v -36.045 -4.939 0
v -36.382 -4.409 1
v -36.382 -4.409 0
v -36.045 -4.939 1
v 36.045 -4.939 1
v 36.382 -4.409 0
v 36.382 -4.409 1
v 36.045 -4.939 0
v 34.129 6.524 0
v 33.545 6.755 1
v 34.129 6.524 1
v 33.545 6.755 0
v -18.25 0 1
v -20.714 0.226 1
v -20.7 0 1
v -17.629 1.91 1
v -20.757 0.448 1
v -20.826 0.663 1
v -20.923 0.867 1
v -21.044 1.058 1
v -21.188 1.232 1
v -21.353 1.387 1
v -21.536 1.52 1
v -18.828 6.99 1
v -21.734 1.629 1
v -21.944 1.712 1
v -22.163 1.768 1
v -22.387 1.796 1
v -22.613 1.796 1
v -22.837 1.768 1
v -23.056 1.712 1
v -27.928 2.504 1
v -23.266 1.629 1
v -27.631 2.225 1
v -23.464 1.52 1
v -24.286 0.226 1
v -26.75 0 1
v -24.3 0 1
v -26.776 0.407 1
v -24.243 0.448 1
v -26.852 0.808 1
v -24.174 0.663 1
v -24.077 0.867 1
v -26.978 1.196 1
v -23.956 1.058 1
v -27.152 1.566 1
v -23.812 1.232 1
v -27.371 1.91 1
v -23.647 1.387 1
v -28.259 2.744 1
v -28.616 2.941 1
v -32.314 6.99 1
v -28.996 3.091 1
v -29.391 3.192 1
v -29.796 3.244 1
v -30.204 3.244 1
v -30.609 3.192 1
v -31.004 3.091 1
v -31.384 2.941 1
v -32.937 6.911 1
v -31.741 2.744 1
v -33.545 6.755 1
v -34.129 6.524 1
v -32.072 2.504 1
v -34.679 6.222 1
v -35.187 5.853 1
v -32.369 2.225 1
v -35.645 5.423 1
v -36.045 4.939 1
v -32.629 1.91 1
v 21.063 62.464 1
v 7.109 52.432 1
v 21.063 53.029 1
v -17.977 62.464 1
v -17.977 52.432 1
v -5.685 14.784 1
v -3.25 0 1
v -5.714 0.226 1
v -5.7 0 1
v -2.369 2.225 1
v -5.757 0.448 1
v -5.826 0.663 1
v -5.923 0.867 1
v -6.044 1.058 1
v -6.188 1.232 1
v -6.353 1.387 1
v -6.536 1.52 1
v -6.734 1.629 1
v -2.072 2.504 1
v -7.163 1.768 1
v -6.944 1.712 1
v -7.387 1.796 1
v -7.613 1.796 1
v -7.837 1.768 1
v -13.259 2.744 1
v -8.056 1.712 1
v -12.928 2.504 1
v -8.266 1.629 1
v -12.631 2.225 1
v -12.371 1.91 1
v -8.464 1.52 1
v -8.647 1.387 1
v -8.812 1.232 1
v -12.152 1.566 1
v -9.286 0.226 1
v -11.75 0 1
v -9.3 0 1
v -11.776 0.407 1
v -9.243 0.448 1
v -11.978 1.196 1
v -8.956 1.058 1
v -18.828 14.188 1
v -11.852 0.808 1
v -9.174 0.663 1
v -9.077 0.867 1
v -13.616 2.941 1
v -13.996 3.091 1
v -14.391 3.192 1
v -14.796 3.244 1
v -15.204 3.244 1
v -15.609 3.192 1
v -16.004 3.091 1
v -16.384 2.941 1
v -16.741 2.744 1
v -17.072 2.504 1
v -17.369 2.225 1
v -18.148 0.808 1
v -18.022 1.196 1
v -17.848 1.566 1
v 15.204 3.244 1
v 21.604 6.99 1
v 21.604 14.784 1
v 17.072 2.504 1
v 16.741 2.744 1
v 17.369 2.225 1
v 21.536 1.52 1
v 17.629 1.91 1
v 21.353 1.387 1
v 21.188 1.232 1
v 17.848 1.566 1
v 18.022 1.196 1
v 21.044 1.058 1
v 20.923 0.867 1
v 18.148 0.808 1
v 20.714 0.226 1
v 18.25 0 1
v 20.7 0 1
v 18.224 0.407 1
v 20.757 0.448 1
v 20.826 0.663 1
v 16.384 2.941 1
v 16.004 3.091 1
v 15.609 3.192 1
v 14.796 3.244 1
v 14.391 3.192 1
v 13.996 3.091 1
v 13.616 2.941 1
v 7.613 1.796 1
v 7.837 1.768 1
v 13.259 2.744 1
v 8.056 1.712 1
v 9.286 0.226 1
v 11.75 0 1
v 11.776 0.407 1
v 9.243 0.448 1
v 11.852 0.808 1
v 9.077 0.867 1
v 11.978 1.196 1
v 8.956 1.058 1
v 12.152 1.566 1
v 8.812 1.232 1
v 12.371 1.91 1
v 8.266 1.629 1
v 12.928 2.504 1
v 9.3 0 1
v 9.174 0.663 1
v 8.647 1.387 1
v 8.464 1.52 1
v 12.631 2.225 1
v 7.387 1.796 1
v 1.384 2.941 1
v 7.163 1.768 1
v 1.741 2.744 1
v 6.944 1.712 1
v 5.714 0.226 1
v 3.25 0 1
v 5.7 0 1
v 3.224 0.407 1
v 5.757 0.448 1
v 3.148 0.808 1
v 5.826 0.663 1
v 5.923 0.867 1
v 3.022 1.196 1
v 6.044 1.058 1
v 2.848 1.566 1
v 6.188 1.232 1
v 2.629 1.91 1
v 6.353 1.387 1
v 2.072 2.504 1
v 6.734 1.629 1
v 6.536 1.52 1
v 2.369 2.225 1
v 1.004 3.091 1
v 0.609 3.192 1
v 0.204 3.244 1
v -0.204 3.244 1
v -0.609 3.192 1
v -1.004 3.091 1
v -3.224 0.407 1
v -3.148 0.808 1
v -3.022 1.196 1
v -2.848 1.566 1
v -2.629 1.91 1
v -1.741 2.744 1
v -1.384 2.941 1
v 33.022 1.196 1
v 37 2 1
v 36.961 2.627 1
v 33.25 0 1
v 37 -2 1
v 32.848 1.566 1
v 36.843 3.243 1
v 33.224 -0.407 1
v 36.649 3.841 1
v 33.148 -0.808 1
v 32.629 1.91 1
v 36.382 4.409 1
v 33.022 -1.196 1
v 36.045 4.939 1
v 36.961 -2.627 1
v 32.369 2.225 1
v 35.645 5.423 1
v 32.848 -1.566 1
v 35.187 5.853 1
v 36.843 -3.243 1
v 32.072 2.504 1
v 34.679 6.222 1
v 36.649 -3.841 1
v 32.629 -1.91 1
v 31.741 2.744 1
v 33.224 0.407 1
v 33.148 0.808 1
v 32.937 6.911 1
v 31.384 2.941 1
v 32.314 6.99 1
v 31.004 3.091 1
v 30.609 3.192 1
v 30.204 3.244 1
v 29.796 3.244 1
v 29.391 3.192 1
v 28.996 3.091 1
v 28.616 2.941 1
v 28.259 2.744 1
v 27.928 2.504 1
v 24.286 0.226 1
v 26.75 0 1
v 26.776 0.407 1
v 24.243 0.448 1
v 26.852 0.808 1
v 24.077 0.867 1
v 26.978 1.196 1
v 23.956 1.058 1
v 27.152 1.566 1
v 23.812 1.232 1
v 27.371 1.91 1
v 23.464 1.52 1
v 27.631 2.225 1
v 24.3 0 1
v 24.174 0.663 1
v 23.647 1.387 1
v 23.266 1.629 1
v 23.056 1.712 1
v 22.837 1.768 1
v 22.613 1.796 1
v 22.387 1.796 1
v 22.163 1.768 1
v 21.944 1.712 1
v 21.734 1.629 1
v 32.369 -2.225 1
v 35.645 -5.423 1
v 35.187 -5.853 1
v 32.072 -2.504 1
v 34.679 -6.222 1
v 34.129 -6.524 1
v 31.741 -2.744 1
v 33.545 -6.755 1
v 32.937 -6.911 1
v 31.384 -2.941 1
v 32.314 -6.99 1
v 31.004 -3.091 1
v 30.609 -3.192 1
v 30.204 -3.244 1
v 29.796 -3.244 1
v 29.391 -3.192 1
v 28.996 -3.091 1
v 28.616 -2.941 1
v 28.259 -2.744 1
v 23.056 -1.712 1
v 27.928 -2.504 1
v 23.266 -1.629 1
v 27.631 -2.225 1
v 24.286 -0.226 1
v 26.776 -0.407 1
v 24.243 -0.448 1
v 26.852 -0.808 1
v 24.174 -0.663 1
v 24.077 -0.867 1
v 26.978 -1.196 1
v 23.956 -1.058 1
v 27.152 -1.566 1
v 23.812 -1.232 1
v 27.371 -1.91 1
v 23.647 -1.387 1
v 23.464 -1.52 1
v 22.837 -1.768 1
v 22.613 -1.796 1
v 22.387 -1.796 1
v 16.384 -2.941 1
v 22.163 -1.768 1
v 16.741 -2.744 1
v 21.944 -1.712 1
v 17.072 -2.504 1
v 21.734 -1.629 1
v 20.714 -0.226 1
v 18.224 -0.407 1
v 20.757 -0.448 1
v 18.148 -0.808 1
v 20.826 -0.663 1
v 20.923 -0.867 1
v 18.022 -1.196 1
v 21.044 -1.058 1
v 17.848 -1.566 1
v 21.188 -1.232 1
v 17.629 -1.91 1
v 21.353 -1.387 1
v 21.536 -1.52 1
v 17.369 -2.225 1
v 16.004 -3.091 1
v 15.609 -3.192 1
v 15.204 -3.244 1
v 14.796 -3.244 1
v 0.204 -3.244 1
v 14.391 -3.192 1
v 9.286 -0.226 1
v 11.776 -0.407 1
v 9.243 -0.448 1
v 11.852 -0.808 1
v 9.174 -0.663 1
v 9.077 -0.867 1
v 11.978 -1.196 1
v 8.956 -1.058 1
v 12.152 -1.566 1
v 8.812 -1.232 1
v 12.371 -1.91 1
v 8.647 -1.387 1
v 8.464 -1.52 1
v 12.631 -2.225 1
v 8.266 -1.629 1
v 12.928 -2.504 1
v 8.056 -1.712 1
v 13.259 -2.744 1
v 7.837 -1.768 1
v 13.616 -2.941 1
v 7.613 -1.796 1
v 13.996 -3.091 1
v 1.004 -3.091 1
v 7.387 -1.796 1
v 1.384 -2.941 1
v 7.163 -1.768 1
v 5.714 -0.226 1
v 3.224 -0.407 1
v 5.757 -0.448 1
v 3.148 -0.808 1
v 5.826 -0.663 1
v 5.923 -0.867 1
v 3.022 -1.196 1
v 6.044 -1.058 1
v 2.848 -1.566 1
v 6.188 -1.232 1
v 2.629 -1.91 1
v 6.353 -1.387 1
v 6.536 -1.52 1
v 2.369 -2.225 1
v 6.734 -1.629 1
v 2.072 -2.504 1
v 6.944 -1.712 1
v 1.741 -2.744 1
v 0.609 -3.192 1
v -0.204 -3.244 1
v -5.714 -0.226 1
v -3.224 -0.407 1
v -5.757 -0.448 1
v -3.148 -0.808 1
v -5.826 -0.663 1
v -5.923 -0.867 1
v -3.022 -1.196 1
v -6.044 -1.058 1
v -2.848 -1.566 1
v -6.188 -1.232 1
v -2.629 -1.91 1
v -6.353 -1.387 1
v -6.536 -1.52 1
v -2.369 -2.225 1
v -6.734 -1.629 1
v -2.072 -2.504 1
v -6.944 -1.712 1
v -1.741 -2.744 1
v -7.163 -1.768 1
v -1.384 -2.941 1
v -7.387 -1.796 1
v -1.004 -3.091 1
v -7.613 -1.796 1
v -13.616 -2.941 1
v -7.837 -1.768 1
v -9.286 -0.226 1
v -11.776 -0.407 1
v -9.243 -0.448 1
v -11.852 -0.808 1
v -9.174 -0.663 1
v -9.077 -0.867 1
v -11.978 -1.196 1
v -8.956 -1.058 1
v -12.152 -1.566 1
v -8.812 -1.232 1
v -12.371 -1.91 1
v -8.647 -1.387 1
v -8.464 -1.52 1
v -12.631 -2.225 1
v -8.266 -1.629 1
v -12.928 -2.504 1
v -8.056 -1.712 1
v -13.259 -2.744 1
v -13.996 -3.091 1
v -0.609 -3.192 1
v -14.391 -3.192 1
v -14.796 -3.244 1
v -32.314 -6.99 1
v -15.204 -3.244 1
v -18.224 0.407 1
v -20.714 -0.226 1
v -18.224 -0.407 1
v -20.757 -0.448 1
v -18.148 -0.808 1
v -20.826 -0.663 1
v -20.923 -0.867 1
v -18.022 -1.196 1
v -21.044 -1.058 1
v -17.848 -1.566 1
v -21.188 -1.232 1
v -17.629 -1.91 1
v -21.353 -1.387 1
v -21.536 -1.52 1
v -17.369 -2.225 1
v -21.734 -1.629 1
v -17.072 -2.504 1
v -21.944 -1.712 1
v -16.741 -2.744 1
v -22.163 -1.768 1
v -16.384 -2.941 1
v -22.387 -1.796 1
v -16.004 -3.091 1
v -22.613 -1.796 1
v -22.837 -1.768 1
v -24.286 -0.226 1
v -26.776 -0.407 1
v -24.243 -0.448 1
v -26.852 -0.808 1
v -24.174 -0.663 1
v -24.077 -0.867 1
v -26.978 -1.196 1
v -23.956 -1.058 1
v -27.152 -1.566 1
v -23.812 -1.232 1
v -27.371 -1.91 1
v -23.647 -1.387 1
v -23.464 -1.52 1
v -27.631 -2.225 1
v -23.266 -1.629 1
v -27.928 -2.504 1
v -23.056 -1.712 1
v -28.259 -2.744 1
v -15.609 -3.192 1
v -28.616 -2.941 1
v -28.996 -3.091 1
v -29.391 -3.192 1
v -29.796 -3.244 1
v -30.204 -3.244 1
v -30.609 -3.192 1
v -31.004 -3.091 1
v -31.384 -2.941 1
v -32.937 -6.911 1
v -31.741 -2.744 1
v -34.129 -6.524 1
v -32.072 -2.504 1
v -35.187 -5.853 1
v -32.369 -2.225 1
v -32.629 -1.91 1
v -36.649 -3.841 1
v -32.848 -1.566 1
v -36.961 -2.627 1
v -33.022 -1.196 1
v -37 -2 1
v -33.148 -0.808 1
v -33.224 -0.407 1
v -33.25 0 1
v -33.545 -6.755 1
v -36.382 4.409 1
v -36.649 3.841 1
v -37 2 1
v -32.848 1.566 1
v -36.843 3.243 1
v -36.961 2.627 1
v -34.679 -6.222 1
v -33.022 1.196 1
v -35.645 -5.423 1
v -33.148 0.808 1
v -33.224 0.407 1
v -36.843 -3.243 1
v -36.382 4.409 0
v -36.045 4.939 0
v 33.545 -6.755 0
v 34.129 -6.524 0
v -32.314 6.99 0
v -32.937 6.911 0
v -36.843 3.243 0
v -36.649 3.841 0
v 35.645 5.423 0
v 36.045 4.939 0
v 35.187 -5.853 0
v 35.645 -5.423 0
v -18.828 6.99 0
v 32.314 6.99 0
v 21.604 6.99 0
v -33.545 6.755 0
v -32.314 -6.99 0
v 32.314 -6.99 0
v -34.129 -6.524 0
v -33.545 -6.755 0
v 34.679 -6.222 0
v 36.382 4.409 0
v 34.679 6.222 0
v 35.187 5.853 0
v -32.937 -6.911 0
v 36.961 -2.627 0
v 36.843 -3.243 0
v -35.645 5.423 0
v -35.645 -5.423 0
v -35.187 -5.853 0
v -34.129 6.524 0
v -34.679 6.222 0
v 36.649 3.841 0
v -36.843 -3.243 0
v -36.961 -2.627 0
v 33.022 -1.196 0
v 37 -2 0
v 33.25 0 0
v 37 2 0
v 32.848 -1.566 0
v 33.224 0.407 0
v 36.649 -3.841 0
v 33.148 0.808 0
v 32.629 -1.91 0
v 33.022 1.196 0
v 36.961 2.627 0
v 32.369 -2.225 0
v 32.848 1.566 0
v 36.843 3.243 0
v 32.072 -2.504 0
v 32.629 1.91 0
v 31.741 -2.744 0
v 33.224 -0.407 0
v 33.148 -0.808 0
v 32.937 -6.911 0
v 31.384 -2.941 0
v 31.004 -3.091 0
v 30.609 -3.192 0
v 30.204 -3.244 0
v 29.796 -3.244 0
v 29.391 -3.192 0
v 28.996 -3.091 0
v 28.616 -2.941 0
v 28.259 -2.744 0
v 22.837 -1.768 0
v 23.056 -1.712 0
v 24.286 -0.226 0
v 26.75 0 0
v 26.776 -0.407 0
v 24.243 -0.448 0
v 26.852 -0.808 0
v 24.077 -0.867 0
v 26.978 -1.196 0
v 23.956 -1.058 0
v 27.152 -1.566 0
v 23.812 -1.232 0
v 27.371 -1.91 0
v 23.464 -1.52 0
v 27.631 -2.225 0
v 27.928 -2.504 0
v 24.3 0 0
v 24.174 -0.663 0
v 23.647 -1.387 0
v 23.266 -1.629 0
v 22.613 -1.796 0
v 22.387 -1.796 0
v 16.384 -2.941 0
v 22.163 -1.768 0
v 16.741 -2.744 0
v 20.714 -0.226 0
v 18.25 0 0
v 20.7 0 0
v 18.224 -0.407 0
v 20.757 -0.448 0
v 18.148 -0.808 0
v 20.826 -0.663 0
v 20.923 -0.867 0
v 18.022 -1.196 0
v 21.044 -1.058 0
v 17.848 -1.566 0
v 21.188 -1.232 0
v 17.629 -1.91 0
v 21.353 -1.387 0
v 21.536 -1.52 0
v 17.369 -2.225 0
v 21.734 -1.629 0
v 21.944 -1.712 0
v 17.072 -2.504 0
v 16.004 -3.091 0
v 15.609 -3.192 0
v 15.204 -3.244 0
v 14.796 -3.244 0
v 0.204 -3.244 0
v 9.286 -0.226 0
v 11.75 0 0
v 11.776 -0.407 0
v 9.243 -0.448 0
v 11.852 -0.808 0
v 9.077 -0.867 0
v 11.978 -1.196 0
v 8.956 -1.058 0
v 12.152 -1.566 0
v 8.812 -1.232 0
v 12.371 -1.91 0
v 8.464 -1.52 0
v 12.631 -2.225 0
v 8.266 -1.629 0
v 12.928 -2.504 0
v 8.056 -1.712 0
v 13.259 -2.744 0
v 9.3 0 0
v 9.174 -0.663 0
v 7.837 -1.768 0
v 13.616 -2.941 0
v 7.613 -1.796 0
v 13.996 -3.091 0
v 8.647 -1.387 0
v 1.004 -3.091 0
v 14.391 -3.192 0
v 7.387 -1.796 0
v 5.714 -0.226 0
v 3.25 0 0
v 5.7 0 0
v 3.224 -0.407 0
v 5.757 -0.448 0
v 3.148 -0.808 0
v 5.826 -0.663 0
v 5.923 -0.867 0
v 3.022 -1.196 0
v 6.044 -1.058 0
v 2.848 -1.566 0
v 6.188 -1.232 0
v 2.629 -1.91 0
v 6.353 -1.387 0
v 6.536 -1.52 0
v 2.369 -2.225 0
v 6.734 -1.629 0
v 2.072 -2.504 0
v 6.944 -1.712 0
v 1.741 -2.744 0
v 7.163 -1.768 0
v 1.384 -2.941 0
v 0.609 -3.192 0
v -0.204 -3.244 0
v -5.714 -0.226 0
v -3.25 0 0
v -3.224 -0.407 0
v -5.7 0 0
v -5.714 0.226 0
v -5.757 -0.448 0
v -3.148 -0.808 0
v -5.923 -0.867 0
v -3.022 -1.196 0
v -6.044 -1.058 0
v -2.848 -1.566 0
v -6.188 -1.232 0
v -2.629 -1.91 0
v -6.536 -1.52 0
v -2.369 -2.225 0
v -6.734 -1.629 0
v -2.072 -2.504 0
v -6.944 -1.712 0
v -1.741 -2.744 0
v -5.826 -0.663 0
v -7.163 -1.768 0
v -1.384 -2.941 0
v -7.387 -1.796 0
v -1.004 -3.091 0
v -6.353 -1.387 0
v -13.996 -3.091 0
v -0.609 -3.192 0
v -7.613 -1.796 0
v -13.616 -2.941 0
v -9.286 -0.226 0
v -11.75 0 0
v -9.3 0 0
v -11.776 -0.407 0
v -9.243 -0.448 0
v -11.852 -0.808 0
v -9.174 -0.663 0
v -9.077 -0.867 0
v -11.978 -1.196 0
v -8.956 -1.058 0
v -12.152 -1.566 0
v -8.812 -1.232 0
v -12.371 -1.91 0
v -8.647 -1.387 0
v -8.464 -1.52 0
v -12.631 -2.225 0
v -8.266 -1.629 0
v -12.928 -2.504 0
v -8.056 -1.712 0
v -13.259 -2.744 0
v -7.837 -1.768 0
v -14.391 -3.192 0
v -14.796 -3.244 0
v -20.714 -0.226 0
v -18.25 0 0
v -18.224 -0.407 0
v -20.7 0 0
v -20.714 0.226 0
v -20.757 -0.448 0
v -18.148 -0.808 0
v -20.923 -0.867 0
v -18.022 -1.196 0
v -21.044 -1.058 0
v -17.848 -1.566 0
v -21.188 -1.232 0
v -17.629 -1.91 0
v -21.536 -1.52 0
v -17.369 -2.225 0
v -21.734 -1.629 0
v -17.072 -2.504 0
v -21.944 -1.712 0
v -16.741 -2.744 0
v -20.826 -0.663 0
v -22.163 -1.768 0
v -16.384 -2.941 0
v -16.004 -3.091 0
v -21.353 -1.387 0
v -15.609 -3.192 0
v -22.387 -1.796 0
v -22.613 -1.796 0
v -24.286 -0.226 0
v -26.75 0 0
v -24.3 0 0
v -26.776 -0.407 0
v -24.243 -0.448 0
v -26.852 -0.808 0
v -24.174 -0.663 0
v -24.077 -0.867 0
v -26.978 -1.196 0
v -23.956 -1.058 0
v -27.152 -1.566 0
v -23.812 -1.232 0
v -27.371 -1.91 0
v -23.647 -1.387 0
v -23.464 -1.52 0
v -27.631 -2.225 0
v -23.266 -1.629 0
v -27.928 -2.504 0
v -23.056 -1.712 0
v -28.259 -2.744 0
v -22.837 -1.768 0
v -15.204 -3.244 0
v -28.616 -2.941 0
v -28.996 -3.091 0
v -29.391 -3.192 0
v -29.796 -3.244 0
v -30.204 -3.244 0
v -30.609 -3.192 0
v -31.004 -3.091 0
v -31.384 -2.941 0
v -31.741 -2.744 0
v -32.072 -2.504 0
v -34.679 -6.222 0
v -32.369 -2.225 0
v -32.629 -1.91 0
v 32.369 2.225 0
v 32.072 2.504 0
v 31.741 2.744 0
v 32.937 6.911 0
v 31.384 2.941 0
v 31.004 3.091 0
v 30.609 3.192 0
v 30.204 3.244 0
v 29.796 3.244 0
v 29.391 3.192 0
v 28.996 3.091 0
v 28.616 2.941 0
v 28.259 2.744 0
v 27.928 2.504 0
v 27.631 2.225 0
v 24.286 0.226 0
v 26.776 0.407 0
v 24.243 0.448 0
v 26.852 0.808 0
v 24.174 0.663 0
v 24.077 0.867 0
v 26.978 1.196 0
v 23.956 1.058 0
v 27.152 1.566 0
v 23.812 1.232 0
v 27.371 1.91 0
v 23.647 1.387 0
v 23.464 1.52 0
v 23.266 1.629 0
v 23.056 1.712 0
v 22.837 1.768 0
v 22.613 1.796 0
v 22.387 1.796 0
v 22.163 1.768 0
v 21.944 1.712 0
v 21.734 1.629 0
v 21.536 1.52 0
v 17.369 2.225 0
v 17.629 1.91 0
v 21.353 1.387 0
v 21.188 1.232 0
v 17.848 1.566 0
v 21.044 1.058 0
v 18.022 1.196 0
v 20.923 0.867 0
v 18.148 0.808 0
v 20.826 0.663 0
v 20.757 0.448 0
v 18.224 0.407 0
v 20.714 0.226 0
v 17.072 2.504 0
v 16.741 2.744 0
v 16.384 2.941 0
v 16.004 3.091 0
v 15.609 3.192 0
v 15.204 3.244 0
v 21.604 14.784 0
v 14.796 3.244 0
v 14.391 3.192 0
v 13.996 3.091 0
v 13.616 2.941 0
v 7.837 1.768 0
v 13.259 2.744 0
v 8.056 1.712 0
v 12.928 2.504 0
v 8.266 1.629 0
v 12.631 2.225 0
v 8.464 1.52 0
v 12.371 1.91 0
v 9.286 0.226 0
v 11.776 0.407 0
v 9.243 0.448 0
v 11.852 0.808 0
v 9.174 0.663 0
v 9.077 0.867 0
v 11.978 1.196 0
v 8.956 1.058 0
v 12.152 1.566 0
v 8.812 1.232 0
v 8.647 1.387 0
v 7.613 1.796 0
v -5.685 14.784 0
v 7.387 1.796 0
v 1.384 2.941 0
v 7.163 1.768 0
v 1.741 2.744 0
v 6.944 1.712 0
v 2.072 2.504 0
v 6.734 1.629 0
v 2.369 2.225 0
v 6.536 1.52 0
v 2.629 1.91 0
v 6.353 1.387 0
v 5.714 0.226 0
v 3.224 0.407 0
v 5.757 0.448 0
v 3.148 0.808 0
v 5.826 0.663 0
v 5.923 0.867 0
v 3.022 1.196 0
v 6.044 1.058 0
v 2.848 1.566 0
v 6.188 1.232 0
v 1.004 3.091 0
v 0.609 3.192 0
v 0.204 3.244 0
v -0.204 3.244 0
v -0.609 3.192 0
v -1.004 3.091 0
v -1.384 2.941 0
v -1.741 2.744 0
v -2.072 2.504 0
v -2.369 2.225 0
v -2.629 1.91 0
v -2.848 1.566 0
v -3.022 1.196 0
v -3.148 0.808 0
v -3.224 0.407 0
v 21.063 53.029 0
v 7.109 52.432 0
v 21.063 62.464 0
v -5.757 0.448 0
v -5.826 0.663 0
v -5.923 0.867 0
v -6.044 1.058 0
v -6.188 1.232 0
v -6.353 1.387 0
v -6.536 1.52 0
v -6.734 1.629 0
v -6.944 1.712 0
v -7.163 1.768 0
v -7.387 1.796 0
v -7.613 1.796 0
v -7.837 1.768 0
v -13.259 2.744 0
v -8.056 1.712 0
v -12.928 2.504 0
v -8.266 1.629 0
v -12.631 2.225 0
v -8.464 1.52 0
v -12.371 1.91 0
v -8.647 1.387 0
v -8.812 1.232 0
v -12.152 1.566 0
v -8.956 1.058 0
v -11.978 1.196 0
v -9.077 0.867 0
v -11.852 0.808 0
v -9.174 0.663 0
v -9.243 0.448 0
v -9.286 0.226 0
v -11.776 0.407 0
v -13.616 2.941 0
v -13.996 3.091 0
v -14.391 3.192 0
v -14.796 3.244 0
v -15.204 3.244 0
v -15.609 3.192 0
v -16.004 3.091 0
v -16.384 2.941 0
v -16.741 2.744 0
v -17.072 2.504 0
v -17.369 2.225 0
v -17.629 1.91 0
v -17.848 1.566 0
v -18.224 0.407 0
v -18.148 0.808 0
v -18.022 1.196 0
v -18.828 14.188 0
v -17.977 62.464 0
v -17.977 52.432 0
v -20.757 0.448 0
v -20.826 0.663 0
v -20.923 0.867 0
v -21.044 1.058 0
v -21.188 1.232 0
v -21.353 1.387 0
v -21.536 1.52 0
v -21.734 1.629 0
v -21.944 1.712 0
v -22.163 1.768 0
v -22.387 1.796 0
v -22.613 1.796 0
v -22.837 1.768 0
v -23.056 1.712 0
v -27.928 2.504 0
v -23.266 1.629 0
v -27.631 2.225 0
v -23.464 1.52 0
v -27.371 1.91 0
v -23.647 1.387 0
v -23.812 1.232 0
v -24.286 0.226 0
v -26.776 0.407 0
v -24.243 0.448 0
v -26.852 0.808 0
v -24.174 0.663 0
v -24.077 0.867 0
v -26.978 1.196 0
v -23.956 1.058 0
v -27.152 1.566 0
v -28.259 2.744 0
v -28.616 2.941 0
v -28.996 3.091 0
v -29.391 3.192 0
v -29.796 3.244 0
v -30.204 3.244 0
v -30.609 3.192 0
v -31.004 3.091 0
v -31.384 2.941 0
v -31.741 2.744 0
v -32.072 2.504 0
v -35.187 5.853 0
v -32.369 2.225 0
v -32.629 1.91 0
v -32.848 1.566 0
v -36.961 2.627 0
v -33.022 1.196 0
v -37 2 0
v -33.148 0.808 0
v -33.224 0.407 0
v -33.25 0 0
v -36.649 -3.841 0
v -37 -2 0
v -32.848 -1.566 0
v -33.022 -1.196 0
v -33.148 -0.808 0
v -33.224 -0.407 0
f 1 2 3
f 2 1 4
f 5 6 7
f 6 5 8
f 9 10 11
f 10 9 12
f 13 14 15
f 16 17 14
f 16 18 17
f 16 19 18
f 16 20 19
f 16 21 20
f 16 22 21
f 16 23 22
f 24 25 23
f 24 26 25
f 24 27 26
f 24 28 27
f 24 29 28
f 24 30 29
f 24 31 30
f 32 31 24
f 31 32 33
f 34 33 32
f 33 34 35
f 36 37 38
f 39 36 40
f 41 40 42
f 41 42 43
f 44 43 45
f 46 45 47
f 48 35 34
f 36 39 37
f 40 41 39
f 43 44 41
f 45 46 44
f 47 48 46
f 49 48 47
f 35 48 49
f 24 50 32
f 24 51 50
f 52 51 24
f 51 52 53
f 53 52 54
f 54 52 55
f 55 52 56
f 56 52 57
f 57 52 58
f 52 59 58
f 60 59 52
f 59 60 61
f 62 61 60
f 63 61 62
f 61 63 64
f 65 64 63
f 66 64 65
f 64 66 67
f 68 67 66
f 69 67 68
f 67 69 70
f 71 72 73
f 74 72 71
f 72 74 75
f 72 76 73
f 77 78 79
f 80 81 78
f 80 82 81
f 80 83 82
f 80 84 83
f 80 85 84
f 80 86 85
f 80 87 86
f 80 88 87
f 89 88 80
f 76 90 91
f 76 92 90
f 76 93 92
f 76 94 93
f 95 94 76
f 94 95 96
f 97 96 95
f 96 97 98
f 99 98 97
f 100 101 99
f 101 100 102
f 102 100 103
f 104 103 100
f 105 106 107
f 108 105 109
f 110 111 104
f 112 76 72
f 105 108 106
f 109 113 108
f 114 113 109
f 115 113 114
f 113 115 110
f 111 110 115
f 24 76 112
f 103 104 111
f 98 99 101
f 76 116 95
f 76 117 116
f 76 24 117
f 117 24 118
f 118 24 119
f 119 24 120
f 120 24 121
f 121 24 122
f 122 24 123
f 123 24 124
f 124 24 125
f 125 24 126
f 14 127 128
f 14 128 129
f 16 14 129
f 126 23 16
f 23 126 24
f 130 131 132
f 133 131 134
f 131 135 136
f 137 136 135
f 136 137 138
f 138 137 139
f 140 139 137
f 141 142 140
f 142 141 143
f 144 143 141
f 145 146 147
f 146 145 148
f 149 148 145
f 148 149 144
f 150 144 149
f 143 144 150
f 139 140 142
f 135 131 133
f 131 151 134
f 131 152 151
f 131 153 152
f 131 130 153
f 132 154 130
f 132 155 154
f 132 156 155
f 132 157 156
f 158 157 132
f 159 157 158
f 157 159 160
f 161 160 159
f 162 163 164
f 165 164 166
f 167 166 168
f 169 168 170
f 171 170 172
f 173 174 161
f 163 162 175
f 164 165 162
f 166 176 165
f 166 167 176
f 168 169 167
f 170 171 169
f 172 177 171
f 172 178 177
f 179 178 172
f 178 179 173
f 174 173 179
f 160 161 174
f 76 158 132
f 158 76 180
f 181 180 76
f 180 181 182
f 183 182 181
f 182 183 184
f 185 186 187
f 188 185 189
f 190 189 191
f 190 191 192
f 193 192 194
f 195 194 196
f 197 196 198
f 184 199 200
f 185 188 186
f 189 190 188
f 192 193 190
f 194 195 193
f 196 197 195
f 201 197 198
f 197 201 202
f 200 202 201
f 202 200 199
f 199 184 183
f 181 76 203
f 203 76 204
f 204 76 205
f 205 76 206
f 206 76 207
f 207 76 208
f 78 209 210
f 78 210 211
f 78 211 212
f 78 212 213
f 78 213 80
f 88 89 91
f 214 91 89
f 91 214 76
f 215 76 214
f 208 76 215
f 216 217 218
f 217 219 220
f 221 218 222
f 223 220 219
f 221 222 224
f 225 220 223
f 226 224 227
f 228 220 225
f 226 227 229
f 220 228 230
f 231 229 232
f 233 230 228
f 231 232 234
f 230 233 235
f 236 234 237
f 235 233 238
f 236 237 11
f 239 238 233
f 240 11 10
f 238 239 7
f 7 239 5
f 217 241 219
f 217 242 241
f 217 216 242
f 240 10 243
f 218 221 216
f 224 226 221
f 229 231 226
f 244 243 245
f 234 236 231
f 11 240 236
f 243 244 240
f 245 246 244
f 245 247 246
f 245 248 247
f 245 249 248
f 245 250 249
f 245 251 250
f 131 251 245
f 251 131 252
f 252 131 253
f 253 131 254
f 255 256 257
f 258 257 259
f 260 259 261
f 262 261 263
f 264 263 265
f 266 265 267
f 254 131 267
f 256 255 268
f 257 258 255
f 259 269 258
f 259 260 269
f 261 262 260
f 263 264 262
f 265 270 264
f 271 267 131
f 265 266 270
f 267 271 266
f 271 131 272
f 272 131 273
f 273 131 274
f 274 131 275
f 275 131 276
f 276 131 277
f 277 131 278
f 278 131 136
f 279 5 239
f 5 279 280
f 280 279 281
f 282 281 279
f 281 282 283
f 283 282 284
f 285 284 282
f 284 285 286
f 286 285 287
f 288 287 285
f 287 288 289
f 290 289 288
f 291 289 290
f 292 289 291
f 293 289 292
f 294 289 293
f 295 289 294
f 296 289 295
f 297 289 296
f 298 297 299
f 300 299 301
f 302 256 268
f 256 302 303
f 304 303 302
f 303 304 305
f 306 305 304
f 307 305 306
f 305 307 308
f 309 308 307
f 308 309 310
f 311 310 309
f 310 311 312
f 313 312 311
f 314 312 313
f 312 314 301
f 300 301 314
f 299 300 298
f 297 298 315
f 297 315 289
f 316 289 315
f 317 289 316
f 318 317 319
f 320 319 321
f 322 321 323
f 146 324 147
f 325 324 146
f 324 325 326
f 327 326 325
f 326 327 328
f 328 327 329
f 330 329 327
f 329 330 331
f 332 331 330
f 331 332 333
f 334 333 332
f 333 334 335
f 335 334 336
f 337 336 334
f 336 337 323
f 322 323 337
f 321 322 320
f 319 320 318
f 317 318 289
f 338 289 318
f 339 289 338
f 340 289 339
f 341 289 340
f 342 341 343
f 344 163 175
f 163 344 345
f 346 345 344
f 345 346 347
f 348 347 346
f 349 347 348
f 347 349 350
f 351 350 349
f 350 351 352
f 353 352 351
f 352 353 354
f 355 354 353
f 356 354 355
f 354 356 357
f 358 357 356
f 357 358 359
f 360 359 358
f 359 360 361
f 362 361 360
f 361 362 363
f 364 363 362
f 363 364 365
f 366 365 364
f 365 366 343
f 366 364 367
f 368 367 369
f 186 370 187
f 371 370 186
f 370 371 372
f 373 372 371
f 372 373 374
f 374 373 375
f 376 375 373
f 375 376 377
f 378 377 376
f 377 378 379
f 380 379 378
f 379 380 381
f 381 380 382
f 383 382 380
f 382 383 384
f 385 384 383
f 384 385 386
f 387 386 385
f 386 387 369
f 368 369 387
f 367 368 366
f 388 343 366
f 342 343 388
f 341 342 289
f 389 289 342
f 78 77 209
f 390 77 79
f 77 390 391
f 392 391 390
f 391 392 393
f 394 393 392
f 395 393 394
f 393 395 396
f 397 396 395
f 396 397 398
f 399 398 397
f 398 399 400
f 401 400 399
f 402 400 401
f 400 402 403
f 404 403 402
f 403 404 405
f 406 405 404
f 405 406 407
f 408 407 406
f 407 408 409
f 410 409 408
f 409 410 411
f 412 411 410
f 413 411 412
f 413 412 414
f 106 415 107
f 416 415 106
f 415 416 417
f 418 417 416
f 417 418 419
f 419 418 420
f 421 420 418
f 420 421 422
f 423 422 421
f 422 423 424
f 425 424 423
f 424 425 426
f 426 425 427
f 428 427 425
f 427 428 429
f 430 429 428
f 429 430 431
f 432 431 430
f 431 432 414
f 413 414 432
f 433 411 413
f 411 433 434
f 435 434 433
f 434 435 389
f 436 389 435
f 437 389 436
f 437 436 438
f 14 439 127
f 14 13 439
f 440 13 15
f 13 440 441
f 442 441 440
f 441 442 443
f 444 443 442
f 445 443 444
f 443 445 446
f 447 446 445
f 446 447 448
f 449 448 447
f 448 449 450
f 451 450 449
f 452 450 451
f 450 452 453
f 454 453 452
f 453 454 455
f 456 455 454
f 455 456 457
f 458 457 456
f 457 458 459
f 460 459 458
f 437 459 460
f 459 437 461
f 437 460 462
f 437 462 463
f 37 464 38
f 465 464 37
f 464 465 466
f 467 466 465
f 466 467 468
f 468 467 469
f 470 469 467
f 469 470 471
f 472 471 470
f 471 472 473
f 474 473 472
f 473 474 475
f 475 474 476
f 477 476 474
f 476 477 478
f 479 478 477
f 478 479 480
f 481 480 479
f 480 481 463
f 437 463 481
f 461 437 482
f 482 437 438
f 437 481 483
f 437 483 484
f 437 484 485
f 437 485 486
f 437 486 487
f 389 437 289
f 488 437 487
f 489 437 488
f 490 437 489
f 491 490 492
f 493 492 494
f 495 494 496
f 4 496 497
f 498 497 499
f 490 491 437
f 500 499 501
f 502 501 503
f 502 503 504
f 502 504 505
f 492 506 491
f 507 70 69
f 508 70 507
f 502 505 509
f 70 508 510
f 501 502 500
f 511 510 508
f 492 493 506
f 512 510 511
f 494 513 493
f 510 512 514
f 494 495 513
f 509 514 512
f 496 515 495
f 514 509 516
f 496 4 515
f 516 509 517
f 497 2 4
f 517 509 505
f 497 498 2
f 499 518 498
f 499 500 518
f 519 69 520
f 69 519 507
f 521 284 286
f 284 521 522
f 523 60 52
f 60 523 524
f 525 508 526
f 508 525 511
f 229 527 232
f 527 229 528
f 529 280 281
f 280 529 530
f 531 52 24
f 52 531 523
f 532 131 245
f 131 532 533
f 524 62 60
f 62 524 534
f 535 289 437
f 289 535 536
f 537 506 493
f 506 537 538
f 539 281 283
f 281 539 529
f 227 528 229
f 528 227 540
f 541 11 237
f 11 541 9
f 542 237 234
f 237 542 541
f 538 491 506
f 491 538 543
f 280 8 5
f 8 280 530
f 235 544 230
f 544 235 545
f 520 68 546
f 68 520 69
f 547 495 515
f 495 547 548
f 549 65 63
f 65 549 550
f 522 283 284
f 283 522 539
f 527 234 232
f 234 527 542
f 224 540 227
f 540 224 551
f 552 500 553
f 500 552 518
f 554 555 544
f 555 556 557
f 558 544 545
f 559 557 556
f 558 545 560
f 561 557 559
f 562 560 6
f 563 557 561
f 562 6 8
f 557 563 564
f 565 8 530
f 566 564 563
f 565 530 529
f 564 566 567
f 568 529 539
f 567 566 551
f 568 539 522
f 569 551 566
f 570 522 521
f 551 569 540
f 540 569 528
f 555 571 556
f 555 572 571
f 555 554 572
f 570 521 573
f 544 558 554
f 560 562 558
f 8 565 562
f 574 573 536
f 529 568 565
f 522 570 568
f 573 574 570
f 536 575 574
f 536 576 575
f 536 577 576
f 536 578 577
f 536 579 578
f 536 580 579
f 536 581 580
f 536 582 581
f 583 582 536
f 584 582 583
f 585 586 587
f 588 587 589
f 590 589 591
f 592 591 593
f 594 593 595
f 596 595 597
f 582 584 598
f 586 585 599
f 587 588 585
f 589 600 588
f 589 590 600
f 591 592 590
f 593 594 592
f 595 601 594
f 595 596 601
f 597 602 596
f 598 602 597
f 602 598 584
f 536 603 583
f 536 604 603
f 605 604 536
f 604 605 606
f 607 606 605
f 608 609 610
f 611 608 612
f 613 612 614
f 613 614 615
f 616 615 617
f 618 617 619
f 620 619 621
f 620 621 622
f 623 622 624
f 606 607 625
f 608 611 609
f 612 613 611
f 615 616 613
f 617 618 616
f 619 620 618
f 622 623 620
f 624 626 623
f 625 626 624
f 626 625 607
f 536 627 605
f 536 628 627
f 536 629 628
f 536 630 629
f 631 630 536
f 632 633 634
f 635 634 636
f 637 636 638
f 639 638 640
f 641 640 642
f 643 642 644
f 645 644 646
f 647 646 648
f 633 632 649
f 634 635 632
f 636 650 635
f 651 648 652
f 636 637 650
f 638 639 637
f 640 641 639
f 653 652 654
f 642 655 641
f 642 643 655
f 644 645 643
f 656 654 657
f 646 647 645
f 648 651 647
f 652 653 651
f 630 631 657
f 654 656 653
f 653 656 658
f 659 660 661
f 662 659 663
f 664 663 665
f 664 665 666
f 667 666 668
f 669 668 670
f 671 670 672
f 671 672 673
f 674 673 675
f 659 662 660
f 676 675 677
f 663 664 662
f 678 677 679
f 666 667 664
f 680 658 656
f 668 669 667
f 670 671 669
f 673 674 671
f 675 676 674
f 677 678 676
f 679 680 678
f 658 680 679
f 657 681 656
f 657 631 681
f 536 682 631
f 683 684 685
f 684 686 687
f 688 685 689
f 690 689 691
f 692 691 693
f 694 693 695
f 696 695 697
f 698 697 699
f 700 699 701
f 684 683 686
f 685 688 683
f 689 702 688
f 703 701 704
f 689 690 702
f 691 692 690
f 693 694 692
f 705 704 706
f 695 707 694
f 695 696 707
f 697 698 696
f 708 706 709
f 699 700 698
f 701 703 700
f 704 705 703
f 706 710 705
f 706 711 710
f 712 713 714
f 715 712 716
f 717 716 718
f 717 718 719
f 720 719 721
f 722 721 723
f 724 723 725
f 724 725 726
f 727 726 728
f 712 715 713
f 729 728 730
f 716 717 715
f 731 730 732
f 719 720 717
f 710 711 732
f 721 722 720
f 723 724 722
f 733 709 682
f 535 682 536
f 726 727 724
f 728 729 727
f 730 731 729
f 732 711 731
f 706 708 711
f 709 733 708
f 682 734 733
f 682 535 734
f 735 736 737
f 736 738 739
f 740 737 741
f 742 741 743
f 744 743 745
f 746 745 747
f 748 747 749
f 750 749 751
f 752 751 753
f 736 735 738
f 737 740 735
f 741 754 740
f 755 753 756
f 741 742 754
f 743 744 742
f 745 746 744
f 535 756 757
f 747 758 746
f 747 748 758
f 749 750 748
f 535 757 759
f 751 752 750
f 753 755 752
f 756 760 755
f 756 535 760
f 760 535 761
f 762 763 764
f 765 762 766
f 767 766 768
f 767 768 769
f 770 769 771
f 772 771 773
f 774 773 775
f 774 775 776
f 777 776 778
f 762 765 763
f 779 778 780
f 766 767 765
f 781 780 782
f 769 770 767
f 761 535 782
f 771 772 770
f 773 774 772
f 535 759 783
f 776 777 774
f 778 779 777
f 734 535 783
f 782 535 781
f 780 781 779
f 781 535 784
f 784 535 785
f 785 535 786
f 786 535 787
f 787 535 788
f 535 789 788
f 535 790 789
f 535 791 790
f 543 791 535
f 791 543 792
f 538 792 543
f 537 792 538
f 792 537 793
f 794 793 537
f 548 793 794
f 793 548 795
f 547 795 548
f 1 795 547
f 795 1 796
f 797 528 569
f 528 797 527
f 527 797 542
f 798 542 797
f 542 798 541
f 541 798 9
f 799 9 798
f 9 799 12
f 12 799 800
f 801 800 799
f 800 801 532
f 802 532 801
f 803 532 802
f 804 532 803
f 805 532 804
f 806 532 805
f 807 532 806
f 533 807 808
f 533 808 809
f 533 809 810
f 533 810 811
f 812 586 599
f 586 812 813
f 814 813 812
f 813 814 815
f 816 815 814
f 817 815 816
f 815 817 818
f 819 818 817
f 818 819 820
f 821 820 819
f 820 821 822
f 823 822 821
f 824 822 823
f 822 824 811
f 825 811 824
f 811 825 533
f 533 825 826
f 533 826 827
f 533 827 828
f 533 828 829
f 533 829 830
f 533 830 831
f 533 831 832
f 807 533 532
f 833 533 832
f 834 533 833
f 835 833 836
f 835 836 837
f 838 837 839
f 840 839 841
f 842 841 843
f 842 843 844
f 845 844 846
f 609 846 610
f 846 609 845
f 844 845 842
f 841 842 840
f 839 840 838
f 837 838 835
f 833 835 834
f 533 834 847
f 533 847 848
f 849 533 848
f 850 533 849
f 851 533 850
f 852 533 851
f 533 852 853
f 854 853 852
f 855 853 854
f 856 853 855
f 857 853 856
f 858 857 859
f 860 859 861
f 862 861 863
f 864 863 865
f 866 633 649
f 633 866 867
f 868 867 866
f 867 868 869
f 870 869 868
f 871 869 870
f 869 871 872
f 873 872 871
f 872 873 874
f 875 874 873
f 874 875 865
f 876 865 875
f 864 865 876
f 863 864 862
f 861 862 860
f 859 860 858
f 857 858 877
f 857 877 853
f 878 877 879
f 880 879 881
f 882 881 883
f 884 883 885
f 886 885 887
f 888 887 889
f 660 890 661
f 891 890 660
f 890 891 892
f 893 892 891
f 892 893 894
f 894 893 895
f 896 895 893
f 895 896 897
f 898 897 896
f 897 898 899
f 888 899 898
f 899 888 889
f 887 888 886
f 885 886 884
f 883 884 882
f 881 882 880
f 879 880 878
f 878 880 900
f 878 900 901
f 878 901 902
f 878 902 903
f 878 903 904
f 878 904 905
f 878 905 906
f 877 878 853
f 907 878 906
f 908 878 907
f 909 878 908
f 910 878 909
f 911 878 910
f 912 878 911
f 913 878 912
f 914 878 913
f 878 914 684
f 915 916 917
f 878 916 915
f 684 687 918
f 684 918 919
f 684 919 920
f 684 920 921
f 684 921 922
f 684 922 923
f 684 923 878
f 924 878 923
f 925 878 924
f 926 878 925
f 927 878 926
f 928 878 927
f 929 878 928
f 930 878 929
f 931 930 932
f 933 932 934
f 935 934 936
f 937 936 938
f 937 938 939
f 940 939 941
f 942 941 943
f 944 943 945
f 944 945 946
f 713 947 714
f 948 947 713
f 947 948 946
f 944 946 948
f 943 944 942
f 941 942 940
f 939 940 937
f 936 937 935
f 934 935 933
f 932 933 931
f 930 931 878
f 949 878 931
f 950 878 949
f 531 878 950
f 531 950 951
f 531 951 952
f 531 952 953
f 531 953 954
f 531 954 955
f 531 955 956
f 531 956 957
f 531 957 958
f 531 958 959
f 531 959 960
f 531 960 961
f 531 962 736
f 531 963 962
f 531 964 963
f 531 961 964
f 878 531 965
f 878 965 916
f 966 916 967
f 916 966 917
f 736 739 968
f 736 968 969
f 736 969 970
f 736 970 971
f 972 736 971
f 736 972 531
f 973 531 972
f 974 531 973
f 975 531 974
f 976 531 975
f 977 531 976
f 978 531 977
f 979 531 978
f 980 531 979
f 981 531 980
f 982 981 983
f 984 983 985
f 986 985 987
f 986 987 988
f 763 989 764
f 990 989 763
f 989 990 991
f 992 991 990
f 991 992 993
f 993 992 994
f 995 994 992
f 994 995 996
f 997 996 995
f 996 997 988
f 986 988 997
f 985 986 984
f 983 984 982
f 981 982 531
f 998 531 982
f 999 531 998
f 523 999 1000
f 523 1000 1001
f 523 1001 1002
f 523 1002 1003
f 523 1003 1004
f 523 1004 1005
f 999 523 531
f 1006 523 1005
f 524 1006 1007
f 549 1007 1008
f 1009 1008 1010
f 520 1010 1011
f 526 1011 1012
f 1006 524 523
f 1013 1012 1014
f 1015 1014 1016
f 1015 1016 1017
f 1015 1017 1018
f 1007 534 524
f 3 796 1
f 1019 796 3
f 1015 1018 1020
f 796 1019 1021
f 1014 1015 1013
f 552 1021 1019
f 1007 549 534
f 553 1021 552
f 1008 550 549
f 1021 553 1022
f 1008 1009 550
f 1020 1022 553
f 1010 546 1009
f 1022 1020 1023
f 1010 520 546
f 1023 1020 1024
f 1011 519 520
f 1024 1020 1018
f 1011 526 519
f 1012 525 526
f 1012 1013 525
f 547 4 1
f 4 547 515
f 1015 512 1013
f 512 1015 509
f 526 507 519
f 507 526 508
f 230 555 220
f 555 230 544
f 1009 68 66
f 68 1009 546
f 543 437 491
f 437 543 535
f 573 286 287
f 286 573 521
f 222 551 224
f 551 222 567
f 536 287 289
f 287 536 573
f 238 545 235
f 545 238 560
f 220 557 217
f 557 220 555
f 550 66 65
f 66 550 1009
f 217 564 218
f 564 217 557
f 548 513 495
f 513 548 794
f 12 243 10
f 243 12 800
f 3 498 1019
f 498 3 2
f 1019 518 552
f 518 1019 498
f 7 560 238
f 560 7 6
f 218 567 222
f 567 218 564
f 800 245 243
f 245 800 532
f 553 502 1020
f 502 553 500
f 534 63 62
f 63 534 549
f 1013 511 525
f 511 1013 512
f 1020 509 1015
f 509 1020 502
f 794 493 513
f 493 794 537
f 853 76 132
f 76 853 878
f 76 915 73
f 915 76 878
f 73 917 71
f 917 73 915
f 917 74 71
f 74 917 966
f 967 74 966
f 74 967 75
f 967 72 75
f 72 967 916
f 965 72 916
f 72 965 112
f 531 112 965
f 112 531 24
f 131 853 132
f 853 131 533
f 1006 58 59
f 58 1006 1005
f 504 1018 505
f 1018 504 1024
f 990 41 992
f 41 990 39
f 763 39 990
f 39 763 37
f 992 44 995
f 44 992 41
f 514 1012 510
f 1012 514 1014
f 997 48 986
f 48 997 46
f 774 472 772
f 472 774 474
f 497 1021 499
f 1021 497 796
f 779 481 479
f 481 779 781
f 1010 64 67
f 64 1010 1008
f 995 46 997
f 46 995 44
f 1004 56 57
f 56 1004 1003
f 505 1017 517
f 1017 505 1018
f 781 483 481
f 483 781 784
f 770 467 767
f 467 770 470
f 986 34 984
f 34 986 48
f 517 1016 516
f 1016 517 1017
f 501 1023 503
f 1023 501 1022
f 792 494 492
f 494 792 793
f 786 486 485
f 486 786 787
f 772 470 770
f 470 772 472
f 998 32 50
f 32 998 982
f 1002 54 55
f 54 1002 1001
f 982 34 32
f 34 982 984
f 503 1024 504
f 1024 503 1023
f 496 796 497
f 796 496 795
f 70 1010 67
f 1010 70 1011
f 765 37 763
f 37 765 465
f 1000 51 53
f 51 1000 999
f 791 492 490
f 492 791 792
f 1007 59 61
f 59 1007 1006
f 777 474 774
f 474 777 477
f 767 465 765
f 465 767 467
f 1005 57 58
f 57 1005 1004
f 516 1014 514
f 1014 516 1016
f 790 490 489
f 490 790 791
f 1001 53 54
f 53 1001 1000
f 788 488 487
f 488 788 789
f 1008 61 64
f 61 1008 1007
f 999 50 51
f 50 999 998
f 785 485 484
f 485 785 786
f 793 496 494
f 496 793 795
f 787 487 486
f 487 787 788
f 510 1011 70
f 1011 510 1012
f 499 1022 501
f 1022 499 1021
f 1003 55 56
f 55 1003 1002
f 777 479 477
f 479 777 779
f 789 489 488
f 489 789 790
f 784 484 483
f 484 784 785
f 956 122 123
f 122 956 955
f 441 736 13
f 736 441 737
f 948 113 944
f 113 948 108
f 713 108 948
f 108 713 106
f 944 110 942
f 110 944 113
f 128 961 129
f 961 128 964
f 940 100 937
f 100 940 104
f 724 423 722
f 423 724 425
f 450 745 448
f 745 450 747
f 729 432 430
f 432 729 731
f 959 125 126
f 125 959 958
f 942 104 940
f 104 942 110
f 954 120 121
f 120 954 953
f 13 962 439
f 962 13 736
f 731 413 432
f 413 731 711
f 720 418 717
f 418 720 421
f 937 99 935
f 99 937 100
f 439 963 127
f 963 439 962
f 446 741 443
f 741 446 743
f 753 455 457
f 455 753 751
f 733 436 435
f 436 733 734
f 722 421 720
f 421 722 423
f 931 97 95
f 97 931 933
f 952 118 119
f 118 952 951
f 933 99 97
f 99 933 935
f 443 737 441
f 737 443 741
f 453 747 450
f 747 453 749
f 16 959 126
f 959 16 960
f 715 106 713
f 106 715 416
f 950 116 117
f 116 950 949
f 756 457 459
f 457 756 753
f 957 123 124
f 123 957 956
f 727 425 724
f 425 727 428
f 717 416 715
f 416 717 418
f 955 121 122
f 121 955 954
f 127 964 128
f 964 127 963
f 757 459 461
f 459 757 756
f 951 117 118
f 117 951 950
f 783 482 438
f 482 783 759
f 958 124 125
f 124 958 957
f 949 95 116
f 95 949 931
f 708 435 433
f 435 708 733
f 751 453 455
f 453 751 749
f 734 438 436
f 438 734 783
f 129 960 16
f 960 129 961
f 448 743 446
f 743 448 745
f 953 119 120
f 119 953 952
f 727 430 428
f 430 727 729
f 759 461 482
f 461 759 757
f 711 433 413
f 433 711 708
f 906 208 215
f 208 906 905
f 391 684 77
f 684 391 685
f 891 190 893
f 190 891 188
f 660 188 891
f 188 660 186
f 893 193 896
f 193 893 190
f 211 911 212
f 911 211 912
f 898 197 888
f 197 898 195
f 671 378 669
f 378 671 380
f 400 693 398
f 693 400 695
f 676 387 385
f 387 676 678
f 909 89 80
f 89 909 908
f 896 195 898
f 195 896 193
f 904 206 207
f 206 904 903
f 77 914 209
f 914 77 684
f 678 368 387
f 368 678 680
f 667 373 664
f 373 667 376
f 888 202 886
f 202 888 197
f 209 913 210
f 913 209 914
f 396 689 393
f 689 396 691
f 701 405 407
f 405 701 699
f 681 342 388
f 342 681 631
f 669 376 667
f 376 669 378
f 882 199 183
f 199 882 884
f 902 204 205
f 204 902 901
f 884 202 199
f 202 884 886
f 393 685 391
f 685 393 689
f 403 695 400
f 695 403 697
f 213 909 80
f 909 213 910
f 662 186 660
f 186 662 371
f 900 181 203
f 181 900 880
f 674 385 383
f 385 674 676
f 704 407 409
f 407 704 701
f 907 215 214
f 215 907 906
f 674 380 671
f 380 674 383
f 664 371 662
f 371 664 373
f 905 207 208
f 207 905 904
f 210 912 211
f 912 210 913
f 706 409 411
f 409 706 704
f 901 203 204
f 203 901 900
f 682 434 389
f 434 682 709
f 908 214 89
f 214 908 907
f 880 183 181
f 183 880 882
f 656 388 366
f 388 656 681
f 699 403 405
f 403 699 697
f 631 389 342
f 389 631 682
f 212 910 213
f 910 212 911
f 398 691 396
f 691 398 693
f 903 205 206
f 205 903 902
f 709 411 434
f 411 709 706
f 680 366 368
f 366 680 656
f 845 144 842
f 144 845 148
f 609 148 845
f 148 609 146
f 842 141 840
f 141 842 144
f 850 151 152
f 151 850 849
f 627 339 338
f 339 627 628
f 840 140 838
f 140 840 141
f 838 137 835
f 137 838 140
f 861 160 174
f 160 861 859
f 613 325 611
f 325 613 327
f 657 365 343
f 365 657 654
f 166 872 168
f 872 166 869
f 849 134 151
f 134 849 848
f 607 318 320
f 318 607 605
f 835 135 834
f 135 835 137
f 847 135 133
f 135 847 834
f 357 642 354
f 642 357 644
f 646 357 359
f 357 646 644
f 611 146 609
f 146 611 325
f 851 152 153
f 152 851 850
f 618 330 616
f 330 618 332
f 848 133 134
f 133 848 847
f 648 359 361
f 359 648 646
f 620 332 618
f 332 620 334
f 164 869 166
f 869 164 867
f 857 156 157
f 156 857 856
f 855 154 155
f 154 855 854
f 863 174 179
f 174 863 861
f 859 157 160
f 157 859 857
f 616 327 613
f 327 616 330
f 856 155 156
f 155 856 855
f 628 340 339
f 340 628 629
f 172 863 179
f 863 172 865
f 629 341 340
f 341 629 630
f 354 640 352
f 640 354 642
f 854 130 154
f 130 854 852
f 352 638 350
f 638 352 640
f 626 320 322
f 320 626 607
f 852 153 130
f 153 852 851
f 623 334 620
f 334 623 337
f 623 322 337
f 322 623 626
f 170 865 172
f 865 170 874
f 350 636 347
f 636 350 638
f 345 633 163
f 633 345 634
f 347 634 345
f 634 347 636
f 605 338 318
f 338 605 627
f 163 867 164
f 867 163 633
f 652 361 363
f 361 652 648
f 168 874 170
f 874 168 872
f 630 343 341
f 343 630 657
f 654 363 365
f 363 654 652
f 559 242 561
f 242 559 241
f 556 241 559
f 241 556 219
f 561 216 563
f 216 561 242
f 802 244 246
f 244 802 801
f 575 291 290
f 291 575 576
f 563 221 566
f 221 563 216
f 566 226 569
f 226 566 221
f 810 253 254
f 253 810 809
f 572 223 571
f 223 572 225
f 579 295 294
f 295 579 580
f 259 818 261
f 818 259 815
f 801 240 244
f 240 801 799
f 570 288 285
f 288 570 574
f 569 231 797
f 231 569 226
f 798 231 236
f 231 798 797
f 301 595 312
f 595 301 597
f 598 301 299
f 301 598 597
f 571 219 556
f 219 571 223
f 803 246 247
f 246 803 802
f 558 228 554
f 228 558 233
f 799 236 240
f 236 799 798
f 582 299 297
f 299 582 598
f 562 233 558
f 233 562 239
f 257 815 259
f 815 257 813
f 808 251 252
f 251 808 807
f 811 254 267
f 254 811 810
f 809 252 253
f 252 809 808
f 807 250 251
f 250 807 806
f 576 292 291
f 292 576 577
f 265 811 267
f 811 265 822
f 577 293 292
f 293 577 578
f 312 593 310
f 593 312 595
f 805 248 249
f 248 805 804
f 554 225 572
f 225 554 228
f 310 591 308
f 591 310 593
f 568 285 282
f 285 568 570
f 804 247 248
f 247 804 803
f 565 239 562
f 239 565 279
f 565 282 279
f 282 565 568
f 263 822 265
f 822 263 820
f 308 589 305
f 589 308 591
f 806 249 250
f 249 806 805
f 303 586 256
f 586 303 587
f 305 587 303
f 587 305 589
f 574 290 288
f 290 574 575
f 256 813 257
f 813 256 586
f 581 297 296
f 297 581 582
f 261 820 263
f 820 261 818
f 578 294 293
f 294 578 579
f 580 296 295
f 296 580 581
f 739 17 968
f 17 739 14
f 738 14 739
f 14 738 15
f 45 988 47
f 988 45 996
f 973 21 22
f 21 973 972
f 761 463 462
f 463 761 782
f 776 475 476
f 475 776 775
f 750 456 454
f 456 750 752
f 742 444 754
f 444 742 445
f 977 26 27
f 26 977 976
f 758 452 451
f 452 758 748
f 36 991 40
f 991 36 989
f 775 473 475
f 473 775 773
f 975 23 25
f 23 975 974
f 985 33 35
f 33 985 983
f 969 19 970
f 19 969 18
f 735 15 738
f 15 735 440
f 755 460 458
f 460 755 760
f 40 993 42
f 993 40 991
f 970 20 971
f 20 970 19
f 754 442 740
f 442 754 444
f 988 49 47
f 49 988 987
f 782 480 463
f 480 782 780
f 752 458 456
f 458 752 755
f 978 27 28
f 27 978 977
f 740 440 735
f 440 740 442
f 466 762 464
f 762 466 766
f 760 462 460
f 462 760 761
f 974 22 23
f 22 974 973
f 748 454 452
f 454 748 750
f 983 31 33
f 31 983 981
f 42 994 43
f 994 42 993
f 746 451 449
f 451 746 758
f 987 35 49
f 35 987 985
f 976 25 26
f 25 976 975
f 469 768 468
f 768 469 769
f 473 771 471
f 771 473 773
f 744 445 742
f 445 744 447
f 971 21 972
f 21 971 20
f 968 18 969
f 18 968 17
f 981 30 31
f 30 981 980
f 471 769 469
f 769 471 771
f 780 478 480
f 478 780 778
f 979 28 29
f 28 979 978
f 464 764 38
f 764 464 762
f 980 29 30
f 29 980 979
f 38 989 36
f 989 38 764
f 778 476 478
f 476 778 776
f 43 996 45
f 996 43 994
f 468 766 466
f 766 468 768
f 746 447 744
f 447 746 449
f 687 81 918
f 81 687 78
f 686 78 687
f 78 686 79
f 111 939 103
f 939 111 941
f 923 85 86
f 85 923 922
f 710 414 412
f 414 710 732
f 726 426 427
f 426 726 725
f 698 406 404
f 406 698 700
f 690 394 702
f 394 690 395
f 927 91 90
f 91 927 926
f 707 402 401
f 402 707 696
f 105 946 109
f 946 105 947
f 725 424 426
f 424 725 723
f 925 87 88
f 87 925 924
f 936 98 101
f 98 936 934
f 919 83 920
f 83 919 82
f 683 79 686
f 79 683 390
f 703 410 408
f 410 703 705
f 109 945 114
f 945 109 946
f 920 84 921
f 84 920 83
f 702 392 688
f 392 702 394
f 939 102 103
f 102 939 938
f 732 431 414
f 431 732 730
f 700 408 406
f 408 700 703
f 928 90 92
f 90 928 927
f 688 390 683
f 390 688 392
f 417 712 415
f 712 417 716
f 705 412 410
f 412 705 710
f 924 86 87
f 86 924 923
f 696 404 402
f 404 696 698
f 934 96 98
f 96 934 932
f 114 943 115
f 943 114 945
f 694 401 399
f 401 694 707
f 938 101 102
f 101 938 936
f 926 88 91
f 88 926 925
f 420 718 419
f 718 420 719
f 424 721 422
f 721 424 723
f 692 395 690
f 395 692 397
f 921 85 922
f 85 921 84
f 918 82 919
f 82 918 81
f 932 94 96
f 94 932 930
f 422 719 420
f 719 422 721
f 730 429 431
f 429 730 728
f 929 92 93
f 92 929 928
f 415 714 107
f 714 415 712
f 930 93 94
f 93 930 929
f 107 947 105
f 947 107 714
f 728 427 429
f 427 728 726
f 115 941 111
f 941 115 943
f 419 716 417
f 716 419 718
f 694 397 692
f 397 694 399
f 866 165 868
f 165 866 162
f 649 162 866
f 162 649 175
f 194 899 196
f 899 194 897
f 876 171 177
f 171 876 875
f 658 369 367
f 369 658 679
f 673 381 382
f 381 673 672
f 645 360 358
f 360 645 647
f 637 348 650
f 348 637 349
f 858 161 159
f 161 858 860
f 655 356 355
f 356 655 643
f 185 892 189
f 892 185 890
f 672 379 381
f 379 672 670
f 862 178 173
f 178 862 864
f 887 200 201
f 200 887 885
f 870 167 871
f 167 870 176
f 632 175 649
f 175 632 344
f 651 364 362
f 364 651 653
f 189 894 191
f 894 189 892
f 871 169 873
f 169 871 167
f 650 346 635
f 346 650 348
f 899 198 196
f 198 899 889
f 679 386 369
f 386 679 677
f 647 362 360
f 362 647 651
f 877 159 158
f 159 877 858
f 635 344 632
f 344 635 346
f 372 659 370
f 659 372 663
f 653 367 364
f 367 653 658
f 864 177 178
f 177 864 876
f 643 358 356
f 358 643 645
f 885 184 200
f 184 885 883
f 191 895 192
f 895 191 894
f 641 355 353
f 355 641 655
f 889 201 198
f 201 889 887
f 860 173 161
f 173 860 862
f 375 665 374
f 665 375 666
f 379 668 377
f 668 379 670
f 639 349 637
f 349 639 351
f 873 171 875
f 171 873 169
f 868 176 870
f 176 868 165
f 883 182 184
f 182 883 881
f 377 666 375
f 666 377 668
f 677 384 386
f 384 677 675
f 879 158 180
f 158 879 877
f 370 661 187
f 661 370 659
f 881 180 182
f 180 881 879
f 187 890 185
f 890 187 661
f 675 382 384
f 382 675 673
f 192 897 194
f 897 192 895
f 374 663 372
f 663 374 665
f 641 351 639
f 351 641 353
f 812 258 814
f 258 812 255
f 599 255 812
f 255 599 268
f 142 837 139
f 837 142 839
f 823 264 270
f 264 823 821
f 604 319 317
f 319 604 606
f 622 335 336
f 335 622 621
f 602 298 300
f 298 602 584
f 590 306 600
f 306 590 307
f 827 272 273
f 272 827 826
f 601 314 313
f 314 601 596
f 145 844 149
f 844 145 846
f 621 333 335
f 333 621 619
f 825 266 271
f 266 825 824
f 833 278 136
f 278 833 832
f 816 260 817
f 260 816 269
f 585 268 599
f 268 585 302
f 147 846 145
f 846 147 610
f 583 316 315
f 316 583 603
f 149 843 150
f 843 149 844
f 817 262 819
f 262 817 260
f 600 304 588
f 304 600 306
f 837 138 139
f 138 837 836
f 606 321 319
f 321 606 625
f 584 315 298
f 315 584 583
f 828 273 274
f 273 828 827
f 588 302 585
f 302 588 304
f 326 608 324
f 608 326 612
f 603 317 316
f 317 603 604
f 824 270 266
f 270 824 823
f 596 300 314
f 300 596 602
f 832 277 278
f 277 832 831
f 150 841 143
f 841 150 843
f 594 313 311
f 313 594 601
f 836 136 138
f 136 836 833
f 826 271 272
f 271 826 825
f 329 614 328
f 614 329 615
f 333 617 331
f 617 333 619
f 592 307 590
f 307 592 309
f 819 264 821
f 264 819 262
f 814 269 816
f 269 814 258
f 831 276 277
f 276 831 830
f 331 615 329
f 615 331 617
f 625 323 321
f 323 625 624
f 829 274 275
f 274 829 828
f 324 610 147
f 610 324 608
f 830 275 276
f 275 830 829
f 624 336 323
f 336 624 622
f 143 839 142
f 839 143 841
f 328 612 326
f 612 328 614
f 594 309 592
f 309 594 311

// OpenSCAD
$fn = 50;


difference() {
	union() {
		hull() {
			translate(v = [-32.0000000000, 2.0000000000, 0]) {
				cylinder(h = 1, r = 5);
			}
			translate(v = [32.0000000000, 2.0000000000, 0]) {
				cylinder(h = 1, r = 5);
			}
			translate(v = [-32.0000000000, -2.0000000000, 0]) {
				cylinder(h = 1, r = 5);
			}
			translate(v = [32.0000000000, -2.0000000000, 0]) {
				cylinder(h = 1, r = 5);
			}
		}
		translate(v = [0, 61.1111111111, 0]) {
			linear_extrude(height = 1) {
				text(font = "DejaVu Sans Mono:style=Bold", halign = "center", size = 57.0000000000, text = "Z", valign = "top");
			}
		}
	}
	union() {
		translate(v = [-30.0000000000, 0.0000000000, 0]) {
			translate(v = [0, 0, -100]) {
				cylinder(h = 200, r = 3.2500000000);
			}
		}
		translate(v = [-15.0000000000, 0.0000000000, 0]) {
			translate(v = [0, 0, -100]) {
				cylinder(h = 200, r = 3.2500000000);
			}
		}
		translate(v = [0, 0, -100]) {
			cylinder(h = 200, r = 3.2500000000);
		}
		translate(v = [15.0000000000, 0.0000000000, 0]) {
			translate(v = [0, 0, -100]) {
				cylinder(h = 200, r = 3.2500000000);
			}
		}
		translate(v = [30.0000000000, 0.0000000000, 0]) {
			translate(v = [0, 0, -100]) {
				cylinder(h = 200, r = 3.2500000000);
			}
		}
		translate(v = [-30.0000000000, 0.0000000000, 0]) {
			translate(v = [0, 0, -100]) {
				cylinder(h = 200, r = 1.8000000000);
			}
		}
		translate(v = [-22.5000000000, 0.0000000000, 0]) {
			translate(v = [0, 0, -100]) {
				cylinder(h = 200, r = 1.8000000000);
			}
		}
		translate(v = [-15.0000000000, 0.0000000000, 0]) {
			translate(v = [0, 0, -100]) {
				cylinder(h = 200, r = 1.8000000000);
			}
		}
		translate(v = [-7.5000000000, 0.0000000000, 0]) {
			translate(v = [0, 0, -100]) {
				cylinder(h = 200, r = 1.8000000000);
			}
		}
		translate(v = [0, 0, -100]) {
			cylinder(h = 200, r = 1.8000000000);
		}
		translate(v = [7.5000000000, 0.0000000000, 0]) {
			translate(v = [0, 0, -100]) {
				cylinder(h = 200, r = 1.8000000000);
			}
		}
		translate(v = [15.0000000000, 0.0000000000, 0]) {
			translate(v = [0, 0, -100]) {
				cylinder(h = 200, r = 1.8000000000);
			}
		}
		translate(v = [22.5000000000, 0.0000000000, 0]) {
			translate(v = [0, 0, -100]) {
				cylinder(h = 200, r = 1.8000000000);
			}
		}
		translate(v = [30.0000000000, 0.0000000000, 0]) {
			translate(v = [0, 0, -100]) {
				cylinder(h = 200, r = 1.8000000000);
			}
		}
	}
}
